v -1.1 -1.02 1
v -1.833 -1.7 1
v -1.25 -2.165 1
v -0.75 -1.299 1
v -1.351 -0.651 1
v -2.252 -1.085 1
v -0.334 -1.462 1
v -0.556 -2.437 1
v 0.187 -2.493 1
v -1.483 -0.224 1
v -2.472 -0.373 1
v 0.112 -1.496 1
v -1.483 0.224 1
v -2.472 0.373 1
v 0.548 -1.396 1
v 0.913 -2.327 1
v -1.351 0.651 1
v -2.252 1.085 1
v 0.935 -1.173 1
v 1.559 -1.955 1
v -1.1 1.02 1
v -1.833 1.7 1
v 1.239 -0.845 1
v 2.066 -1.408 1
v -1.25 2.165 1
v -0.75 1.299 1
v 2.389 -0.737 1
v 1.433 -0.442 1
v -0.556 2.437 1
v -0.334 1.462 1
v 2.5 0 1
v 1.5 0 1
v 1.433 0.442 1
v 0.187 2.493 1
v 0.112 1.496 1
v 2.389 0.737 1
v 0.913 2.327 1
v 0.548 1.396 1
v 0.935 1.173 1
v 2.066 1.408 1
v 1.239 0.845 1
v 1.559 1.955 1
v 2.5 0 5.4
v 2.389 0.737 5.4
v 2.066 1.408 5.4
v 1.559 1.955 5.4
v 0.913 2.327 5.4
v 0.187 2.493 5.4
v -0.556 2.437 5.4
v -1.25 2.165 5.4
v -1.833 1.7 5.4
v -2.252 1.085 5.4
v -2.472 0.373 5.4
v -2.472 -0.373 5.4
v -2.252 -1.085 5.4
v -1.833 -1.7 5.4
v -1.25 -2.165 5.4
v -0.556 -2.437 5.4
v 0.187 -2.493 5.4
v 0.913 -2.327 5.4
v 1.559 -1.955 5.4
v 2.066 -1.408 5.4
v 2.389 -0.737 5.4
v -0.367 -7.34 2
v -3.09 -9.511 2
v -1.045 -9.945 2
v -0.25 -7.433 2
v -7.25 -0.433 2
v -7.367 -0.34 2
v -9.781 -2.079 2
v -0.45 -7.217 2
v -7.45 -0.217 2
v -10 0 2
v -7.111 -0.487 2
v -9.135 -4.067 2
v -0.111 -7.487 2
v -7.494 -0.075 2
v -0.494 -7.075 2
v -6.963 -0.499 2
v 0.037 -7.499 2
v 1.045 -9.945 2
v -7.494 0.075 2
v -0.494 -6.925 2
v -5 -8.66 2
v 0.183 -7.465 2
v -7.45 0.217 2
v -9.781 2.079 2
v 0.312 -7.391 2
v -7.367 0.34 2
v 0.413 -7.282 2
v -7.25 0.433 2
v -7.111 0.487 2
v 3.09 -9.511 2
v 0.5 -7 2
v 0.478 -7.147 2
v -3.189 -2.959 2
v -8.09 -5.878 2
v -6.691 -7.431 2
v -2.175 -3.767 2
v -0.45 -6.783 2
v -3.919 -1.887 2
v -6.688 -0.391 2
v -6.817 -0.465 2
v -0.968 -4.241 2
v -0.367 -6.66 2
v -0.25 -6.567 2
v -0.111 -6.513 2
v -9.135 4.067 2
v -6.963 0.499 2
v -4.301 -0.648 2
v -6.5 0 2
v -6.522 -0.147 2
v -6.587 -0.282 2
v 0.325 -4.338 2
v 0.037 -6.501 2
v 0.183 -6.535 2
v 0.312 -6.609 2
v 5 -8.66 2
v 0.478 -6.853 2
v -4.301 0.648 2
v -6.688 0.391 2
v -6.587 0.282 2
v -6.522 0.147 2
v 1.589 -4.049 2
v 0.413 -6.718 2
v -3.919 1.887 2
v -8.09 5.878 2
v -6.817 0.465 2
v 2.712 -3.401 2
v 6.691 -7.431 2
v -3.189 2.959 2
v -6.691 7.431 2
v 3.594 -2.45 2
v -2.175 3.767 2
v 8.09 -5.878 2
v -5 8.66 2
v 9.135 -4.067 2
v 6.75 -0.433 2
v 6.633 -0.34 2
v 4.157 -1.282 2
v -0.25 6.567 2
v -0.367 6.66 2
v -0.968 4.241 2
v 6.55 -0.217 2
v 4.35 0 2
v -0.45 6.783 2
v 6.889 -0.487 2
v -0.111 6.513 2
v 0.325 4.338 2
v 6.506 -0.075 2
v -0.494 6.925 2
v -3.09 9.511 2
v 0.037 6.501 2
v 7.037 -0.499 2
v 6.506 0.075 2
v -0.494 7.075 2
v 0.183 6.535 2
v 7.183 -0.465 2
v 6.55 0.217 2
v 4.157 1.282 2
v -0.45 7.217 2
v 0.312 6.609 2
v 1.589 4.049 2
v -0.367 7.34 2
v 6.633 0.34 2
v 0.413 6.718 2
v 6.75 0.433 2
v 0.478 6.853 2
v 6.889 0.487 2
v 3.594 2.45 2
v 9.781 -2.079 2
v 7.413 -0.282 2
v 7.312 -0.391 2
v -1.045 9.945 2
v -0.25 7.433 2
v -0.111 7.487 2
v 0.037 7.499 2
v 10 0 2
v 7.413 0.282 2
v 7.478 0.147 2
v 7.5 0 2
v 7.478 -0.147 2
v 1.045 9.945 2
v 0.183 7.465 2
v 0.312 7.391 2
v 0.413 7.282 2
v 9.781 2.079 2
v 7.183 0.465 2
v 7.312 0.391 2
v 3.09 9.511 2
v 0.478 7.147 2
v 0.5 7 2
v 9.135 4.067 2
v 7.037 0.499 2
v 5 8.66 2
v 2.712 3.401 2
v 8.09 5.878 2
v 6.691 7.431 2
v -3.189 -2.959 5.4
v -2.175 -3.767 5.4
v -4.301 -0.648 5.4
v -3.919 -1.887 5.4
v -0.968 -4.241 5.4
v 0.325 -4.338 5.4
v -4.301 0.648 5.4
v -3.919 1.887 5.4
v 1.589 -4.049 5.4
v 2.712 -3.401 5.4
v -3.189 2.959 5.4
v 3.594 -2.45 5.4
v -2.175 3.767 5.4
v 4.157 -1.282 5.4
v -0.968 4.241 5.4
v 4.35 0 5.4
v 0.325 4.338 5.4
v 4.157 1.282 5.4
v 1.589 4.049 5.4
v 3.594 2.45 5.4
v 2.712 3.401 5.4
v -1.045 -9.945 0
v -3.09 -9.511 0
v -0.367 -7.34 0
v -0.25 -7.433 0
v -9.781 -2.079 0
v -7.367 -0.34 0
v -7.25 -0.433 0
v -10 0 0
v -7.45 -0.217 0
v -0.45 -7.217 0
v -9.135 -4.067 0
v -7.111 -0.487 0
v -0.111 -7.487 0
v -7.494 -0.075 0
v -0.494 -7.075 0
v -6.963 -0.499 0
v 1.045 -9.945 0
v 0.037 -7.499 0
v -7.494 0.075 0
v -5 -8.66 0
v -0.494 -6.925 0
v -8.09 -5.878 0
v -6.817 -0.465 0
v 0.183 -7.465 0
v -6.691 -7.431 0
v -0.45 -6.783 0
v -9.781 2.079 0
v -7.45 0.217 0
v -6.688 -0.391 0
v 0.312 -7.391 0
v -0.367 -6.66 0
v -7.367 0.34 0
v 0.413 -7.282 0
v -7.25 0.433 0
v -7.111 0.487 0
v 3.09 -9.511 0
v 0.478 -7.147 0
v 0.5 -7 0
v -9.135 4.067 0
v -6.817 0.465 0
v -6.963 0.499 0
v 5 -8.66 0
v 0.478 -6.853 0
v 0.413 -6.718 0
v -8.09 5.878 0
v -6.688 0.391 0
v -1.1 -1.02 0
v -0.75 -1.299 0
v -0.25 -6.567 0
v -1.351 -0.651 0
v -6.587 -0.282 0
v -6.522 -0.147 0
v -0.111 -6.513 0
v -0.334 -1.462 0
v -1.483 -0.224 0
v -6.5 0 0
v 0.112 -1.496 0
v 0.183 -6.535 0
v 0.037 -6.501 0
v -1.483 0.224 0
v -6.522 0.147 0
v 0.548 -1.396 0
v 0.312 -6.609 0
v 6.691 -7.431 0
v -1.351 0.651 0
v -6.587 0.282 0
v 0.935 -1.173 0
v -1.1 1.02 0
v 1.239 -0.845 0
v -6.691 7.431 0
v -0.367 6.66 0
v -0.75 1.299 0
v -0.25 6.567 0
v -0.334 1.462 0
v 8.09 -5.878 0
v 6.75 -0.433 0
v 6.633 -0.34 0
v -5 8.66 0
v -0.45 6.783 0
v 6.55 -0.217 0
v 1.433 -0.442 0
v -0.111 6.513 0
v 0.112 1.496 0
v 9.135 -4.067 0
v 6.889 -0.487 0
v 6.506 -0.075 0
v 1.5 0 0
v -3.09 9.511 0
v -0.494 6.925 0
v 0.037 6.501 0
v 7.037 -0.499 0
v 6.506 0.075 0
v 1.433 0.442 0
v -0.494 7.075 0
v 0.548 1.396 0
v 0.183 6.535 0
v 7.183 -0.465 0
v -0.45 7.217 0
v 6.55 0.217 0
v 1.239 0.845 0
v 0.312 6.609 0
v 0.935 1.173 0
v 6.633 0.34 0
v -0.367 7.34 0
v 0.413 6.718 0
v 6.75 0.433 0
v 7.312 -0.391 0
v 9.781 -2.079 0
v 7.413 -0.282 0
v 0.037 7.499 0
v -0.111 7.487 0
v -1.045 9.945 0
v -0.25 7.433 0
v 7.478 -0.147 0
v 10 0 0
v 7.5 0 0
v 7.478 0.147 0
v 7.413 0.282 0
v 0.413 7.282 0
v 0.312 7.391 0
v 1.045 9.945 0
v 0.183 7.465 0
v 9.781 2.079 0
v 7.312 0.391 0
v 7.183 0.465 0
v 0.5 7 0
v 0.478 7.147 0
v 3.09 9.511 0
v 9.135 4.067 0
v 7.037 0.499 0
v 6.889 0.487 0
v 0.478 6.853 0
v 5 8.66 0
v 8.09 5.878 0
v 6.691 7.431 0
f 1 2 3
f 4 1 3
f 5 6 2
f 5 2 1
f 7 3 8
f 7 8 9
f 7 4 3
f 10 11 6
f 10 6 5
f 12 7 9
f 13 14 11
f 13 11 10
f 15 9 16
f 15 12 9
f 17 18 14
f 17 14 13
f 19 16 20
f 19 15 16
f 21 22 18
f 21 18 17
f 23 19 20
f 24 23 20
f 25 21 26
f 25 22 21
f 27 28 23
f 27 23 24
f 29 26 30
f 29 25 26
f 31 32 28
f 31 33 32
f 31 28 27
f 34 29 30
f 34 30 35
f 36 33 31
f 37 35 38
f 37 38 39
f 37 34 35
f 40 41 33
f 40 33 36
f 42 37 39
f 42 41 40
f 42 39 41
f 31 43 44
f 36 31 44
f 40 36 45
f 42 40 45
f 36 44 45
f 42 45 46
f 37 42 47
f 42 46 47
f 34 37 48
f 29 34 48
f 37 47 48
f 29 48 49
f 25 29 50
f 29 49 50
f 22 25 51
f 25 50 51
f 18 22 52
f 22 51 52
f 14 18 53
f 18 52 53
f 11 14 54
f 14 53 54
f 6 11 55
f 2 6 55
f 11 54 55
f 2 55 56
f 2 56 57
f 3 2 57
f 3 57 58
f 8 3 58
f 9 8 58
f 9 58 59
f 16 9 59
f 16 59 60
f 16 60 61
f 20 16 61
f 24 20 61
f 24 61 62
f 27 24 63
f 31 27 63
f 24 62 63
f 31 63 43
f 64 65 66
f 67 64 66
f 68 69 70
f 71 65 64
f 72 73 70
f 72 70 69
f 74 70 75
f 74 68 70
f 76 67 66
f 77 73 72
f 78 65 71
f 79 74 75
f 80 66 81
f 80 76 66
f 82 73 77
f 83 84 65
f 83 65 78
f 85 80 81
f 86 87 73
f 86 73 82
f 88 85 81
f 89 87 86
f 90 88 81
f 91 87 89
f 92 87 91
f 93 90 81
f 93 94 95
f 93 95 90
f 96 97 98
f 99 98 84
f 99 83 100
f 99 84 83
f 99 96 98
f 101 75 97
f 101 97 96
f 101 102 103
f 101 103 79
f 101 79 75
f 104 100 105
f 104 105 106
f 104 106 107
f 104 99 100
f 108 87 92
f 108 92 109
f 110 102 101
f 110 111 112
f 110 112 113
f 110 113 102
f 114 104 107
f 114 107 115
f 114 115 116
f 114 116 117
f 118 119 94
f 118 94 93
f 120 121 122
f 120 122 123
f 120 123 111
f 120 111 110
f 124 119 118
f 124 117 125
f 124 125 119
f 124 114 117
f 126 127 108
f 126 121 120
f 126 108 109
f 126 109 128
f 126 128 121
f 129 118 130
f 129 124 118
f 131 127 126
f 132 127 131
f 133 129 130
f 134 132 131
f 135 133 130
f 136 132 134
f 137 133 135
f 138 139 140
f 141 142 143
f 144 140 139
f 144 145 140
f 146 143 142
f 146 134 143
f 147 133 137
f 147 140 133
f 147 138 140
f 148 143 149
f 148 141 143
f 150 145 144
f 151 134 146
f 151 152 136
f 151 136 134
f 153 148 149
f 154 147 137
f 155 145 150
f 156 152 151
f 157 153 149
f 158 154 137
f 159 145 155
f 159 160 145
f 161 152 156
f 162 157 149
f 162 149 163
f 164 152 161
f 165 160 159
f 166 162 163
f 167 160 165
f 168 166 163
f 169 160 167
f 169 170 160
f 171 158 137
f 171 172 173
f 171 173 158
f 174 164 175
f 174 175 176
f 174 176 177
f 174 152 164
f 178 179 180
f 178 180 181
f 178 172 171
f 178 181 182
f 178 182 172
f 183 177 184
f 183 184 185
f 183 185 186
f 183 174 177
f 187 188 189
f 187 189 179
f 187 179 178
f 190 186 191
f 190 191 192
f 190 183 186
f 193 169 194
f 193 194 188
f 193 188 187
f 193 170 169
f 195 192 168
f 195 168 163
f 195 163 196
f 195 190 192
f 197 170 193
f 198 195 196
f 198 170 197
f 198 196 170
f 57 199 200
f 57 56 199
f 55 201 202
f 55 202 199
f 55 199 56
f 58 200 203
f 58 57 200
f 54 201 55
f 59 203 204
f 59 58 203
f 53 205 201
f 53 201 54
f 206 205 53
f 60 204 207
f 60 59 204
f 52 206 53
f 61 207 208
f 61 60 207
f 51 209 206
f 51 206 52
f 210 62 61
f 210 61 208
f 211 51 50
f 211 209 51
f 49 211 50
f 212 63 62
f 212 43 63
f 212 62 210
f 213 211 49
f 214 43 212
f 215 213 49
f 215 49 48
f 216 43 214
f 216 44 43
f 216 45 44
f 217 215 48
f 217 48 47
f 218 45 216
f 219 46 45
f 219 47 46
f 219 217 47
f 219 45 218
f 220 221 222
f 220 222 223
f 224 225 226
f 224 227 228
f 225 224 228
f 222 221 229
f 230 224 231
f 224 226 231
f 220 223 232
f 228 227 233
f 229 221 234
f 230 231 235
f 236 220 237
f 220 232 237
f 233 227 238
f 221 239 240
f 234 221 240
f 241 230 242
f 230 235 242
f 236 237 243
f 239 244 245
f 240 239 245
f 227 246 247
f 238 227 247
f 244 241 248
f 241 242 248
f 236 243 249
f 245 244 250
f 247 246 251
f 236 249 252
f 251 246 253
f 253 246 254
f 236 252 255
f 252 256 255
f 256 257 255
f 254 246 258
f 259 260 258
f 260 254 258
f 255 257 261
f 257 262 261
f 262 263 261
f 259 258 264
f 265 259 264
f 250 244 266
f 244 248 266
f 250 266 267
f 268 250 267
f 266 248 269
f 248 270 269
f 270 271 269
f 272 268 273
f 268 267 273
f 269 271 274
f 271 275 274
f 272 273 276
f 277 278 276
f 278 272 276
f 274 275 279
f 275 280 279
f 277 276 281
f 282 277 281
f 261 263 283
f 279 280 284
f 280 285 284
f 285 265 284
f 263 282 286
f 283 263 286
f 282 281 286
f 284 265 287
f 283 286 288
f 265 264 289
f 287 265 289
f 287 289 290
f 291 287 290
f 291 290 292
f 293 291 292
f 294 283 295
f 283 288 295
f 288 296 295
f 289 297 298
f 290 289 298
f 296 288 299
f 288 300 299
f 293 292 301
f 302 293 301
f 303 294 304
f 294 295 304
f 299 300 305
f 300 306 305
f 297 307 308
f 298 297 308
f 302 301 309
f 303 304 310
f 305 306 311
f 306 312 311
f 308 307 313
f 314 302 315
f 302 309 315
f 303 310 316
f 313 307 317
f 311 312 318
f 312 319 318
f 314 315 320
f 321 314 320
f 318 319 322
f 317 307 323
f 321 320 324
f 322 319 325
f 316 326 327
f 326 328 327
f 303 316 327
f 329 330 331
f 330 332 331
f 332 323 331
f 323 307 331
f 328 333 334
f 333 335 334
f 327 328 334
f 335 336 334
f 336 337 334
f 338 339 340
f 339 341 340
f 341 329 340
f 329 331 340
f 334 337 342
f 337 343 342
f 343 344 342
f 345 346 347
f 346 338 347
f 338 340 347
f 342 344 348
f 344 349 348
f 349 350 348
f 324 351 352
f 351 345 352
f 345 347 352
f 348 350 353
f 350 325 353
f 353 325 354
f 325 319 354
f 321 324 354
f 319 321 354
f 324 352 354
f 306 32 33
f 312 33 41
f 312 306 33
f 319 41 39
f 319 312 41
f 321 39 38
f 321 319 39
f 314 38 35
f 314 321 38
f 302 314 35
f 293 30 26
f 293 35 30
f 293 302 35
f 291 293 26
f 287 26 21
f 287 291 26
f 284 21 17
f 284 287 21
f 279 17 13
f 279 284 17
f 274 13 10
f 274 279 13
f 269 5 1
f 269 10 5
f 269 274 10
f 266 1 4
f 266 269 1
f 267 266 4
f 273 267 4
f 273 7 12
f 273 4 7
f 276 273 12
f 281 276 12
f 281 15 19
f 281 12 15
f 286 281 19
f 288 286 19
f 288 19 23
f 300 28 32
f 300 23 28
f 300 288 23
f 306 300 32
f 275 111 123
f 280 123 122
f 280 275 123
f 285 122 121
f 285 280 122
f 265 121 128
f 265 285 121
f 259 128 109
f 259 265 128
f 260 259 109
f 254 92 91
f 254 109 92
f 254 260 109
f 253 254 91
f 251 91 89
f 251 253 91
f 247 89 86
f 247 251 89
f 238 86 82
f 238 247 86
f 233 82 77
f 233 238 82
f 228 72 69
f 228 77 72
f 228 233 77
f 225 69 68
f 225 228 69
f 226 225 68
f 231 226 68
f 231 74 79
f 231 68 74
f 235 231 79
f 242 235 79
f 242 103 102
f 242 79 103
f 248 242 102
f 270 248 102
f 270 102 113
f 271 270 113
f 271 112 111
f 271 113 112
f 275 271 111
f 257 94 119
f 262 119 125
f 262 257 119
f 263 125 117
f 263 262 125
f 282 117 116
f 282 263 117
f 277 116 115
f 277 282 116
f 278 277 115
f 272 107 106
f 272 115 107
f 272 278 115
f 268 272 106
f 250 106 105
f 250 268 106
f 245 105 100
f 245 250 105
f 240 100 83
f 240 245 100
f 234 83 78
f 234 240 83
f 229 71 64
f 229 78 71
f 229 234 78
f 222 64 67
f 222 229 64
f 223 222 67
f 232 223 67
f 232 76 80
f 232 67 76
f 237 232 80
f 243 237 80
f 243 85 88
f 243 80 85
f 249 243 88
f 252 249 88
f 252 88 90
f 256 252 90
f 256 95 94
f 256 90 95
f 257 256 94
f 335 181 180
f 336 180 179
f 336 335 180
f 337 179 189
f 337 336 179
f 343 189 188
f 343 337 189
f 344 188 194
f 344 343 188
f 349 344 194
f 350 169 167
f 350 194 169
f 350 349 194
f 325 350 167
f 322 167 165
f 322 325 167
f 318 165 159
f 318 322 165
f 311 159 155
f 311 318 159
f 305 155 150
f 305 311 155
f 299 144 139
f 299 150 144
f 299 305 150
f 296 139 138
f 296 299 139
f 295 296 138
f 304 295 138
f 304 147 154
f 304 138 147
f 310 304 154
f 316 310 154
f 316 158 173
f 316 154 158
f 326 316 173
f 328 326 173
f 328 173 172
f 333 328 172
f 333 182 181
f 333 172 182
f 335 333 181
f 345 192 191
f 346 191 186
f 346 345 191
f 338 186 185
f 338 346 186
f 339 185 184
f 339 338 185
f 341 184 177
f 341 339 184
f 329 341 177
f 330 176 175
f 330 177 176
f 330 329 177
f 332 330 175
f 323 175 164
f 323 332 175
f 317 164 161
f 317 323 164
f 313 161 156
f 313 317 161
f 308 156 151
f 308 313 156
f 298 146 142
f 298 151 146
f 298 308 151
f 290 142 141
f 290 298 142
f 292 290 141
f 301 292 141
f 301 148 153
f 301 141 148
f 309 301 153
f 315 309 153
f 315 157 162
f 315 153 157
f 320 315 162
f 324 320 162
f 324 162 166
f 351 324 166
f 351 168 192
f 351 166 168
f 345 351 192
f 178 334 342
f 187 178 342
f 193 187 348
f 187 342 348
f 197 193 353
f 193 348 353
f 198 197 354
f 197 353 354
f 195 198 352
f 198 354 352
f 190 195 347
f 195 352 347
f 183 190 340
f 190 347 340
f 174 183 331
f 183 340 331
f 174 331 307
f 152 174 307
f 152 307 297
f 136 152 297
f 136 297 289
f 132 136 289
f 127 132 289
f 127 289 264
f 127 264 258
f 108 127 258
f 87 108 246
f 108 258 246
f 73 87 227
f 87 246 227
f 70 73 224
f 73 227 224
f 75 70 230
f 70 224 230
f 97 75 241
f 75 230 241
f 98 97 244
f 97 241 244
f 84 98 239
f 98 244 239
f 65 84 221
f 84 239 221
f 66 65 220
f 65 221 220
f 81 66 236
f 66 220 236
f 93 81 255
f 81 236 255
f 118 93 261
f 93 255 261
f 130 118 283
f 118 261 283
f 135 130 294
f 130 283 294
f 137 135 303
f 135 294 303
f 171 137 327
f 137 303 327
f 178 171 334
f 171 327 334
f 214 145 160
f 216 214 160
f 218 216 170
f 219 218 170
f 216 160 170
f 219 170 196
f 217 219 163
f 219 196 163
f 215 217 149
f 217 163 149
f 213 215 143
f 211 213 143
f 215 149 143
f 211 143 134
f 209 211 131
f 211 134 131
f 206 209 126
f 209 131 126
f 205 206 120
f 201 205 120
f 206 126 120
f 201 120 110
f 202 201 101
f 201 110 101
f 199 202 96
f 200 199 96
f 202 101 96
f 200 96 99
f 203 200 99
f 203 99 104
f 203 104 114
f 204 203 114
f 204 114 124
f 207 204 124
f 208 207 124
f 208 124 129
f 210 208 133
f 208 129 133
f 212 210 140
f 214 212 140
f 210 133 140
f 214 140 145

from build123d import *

# Parameters (mm, degrees)
SKETCH_1_R          = 10
EXTRUDE_1_DEPTH     = 2
SKETCH_2_R          = 4.35
EXTRUDE_2_DEPTH     = 3.4
SKETCH_3_R          = 1.5
CUT_EXTRUDE_1_DEPTH = 9.4
SKETCH_4_R          = 0.5
CUT_EXTRUDE_3_DEPTH = 16.4
SKETCH_5_R          = 2.5
CUT_EXTRUDE_4_DEPTH = 4.4


with BuildPart() as part:
    # 草图1 → 凸台-拉伸1 (new body)
    with BuildSketch(Plane.XY):
        Circle(SKETCH_1_R)
    extrude(amount=EXTRUDE_1_DEPTH)

    # 草图2 → 凸台-拉伸2 (add)
    with BuildSketch(Plane.XY.offset(2)):
        Circle(SKETCH_2_R)
    extrude(amount=EXTRUDE_2_DEPTH)

    # 草图3 → 切除-拉伸1 (cut)
    with BuildSketch(Plane.XY):
        Circle(SKETCH_3_R)
    extrude(amount=CUT_EXTRUDE_1_DEPTH, mode=Mode.SUBTRACT)

    # 草图4 → 切除-拉伸3 (cut)
    with BuildSketch(Plane.XY):
        with Locations((0, 7)):
            Circle(SKETCH_4_R)
        with Locations((7, 0)):
            Circle(SKETCH_4_R)
        with Locations((0, -7)):
            Circle(SKETCH_4_R)
        with Locations((-7, 0)):
            Circle(SKETCH_4_R)
    extrude(amount=CUT_EXTRUDE_3_DEPTH, mode=Mode.SUBTRACT)

    # 草图5 → 切除-拉伸4 (cut)
    with BuildSketch(Plane.XY.offset(5.4)):
        Circle(SKETCH_5_R)
    extrude(amount=-CUT_EXTRUDE_4_DEPTH, mode=Mode.SUBTRACT)


solid = part.part
